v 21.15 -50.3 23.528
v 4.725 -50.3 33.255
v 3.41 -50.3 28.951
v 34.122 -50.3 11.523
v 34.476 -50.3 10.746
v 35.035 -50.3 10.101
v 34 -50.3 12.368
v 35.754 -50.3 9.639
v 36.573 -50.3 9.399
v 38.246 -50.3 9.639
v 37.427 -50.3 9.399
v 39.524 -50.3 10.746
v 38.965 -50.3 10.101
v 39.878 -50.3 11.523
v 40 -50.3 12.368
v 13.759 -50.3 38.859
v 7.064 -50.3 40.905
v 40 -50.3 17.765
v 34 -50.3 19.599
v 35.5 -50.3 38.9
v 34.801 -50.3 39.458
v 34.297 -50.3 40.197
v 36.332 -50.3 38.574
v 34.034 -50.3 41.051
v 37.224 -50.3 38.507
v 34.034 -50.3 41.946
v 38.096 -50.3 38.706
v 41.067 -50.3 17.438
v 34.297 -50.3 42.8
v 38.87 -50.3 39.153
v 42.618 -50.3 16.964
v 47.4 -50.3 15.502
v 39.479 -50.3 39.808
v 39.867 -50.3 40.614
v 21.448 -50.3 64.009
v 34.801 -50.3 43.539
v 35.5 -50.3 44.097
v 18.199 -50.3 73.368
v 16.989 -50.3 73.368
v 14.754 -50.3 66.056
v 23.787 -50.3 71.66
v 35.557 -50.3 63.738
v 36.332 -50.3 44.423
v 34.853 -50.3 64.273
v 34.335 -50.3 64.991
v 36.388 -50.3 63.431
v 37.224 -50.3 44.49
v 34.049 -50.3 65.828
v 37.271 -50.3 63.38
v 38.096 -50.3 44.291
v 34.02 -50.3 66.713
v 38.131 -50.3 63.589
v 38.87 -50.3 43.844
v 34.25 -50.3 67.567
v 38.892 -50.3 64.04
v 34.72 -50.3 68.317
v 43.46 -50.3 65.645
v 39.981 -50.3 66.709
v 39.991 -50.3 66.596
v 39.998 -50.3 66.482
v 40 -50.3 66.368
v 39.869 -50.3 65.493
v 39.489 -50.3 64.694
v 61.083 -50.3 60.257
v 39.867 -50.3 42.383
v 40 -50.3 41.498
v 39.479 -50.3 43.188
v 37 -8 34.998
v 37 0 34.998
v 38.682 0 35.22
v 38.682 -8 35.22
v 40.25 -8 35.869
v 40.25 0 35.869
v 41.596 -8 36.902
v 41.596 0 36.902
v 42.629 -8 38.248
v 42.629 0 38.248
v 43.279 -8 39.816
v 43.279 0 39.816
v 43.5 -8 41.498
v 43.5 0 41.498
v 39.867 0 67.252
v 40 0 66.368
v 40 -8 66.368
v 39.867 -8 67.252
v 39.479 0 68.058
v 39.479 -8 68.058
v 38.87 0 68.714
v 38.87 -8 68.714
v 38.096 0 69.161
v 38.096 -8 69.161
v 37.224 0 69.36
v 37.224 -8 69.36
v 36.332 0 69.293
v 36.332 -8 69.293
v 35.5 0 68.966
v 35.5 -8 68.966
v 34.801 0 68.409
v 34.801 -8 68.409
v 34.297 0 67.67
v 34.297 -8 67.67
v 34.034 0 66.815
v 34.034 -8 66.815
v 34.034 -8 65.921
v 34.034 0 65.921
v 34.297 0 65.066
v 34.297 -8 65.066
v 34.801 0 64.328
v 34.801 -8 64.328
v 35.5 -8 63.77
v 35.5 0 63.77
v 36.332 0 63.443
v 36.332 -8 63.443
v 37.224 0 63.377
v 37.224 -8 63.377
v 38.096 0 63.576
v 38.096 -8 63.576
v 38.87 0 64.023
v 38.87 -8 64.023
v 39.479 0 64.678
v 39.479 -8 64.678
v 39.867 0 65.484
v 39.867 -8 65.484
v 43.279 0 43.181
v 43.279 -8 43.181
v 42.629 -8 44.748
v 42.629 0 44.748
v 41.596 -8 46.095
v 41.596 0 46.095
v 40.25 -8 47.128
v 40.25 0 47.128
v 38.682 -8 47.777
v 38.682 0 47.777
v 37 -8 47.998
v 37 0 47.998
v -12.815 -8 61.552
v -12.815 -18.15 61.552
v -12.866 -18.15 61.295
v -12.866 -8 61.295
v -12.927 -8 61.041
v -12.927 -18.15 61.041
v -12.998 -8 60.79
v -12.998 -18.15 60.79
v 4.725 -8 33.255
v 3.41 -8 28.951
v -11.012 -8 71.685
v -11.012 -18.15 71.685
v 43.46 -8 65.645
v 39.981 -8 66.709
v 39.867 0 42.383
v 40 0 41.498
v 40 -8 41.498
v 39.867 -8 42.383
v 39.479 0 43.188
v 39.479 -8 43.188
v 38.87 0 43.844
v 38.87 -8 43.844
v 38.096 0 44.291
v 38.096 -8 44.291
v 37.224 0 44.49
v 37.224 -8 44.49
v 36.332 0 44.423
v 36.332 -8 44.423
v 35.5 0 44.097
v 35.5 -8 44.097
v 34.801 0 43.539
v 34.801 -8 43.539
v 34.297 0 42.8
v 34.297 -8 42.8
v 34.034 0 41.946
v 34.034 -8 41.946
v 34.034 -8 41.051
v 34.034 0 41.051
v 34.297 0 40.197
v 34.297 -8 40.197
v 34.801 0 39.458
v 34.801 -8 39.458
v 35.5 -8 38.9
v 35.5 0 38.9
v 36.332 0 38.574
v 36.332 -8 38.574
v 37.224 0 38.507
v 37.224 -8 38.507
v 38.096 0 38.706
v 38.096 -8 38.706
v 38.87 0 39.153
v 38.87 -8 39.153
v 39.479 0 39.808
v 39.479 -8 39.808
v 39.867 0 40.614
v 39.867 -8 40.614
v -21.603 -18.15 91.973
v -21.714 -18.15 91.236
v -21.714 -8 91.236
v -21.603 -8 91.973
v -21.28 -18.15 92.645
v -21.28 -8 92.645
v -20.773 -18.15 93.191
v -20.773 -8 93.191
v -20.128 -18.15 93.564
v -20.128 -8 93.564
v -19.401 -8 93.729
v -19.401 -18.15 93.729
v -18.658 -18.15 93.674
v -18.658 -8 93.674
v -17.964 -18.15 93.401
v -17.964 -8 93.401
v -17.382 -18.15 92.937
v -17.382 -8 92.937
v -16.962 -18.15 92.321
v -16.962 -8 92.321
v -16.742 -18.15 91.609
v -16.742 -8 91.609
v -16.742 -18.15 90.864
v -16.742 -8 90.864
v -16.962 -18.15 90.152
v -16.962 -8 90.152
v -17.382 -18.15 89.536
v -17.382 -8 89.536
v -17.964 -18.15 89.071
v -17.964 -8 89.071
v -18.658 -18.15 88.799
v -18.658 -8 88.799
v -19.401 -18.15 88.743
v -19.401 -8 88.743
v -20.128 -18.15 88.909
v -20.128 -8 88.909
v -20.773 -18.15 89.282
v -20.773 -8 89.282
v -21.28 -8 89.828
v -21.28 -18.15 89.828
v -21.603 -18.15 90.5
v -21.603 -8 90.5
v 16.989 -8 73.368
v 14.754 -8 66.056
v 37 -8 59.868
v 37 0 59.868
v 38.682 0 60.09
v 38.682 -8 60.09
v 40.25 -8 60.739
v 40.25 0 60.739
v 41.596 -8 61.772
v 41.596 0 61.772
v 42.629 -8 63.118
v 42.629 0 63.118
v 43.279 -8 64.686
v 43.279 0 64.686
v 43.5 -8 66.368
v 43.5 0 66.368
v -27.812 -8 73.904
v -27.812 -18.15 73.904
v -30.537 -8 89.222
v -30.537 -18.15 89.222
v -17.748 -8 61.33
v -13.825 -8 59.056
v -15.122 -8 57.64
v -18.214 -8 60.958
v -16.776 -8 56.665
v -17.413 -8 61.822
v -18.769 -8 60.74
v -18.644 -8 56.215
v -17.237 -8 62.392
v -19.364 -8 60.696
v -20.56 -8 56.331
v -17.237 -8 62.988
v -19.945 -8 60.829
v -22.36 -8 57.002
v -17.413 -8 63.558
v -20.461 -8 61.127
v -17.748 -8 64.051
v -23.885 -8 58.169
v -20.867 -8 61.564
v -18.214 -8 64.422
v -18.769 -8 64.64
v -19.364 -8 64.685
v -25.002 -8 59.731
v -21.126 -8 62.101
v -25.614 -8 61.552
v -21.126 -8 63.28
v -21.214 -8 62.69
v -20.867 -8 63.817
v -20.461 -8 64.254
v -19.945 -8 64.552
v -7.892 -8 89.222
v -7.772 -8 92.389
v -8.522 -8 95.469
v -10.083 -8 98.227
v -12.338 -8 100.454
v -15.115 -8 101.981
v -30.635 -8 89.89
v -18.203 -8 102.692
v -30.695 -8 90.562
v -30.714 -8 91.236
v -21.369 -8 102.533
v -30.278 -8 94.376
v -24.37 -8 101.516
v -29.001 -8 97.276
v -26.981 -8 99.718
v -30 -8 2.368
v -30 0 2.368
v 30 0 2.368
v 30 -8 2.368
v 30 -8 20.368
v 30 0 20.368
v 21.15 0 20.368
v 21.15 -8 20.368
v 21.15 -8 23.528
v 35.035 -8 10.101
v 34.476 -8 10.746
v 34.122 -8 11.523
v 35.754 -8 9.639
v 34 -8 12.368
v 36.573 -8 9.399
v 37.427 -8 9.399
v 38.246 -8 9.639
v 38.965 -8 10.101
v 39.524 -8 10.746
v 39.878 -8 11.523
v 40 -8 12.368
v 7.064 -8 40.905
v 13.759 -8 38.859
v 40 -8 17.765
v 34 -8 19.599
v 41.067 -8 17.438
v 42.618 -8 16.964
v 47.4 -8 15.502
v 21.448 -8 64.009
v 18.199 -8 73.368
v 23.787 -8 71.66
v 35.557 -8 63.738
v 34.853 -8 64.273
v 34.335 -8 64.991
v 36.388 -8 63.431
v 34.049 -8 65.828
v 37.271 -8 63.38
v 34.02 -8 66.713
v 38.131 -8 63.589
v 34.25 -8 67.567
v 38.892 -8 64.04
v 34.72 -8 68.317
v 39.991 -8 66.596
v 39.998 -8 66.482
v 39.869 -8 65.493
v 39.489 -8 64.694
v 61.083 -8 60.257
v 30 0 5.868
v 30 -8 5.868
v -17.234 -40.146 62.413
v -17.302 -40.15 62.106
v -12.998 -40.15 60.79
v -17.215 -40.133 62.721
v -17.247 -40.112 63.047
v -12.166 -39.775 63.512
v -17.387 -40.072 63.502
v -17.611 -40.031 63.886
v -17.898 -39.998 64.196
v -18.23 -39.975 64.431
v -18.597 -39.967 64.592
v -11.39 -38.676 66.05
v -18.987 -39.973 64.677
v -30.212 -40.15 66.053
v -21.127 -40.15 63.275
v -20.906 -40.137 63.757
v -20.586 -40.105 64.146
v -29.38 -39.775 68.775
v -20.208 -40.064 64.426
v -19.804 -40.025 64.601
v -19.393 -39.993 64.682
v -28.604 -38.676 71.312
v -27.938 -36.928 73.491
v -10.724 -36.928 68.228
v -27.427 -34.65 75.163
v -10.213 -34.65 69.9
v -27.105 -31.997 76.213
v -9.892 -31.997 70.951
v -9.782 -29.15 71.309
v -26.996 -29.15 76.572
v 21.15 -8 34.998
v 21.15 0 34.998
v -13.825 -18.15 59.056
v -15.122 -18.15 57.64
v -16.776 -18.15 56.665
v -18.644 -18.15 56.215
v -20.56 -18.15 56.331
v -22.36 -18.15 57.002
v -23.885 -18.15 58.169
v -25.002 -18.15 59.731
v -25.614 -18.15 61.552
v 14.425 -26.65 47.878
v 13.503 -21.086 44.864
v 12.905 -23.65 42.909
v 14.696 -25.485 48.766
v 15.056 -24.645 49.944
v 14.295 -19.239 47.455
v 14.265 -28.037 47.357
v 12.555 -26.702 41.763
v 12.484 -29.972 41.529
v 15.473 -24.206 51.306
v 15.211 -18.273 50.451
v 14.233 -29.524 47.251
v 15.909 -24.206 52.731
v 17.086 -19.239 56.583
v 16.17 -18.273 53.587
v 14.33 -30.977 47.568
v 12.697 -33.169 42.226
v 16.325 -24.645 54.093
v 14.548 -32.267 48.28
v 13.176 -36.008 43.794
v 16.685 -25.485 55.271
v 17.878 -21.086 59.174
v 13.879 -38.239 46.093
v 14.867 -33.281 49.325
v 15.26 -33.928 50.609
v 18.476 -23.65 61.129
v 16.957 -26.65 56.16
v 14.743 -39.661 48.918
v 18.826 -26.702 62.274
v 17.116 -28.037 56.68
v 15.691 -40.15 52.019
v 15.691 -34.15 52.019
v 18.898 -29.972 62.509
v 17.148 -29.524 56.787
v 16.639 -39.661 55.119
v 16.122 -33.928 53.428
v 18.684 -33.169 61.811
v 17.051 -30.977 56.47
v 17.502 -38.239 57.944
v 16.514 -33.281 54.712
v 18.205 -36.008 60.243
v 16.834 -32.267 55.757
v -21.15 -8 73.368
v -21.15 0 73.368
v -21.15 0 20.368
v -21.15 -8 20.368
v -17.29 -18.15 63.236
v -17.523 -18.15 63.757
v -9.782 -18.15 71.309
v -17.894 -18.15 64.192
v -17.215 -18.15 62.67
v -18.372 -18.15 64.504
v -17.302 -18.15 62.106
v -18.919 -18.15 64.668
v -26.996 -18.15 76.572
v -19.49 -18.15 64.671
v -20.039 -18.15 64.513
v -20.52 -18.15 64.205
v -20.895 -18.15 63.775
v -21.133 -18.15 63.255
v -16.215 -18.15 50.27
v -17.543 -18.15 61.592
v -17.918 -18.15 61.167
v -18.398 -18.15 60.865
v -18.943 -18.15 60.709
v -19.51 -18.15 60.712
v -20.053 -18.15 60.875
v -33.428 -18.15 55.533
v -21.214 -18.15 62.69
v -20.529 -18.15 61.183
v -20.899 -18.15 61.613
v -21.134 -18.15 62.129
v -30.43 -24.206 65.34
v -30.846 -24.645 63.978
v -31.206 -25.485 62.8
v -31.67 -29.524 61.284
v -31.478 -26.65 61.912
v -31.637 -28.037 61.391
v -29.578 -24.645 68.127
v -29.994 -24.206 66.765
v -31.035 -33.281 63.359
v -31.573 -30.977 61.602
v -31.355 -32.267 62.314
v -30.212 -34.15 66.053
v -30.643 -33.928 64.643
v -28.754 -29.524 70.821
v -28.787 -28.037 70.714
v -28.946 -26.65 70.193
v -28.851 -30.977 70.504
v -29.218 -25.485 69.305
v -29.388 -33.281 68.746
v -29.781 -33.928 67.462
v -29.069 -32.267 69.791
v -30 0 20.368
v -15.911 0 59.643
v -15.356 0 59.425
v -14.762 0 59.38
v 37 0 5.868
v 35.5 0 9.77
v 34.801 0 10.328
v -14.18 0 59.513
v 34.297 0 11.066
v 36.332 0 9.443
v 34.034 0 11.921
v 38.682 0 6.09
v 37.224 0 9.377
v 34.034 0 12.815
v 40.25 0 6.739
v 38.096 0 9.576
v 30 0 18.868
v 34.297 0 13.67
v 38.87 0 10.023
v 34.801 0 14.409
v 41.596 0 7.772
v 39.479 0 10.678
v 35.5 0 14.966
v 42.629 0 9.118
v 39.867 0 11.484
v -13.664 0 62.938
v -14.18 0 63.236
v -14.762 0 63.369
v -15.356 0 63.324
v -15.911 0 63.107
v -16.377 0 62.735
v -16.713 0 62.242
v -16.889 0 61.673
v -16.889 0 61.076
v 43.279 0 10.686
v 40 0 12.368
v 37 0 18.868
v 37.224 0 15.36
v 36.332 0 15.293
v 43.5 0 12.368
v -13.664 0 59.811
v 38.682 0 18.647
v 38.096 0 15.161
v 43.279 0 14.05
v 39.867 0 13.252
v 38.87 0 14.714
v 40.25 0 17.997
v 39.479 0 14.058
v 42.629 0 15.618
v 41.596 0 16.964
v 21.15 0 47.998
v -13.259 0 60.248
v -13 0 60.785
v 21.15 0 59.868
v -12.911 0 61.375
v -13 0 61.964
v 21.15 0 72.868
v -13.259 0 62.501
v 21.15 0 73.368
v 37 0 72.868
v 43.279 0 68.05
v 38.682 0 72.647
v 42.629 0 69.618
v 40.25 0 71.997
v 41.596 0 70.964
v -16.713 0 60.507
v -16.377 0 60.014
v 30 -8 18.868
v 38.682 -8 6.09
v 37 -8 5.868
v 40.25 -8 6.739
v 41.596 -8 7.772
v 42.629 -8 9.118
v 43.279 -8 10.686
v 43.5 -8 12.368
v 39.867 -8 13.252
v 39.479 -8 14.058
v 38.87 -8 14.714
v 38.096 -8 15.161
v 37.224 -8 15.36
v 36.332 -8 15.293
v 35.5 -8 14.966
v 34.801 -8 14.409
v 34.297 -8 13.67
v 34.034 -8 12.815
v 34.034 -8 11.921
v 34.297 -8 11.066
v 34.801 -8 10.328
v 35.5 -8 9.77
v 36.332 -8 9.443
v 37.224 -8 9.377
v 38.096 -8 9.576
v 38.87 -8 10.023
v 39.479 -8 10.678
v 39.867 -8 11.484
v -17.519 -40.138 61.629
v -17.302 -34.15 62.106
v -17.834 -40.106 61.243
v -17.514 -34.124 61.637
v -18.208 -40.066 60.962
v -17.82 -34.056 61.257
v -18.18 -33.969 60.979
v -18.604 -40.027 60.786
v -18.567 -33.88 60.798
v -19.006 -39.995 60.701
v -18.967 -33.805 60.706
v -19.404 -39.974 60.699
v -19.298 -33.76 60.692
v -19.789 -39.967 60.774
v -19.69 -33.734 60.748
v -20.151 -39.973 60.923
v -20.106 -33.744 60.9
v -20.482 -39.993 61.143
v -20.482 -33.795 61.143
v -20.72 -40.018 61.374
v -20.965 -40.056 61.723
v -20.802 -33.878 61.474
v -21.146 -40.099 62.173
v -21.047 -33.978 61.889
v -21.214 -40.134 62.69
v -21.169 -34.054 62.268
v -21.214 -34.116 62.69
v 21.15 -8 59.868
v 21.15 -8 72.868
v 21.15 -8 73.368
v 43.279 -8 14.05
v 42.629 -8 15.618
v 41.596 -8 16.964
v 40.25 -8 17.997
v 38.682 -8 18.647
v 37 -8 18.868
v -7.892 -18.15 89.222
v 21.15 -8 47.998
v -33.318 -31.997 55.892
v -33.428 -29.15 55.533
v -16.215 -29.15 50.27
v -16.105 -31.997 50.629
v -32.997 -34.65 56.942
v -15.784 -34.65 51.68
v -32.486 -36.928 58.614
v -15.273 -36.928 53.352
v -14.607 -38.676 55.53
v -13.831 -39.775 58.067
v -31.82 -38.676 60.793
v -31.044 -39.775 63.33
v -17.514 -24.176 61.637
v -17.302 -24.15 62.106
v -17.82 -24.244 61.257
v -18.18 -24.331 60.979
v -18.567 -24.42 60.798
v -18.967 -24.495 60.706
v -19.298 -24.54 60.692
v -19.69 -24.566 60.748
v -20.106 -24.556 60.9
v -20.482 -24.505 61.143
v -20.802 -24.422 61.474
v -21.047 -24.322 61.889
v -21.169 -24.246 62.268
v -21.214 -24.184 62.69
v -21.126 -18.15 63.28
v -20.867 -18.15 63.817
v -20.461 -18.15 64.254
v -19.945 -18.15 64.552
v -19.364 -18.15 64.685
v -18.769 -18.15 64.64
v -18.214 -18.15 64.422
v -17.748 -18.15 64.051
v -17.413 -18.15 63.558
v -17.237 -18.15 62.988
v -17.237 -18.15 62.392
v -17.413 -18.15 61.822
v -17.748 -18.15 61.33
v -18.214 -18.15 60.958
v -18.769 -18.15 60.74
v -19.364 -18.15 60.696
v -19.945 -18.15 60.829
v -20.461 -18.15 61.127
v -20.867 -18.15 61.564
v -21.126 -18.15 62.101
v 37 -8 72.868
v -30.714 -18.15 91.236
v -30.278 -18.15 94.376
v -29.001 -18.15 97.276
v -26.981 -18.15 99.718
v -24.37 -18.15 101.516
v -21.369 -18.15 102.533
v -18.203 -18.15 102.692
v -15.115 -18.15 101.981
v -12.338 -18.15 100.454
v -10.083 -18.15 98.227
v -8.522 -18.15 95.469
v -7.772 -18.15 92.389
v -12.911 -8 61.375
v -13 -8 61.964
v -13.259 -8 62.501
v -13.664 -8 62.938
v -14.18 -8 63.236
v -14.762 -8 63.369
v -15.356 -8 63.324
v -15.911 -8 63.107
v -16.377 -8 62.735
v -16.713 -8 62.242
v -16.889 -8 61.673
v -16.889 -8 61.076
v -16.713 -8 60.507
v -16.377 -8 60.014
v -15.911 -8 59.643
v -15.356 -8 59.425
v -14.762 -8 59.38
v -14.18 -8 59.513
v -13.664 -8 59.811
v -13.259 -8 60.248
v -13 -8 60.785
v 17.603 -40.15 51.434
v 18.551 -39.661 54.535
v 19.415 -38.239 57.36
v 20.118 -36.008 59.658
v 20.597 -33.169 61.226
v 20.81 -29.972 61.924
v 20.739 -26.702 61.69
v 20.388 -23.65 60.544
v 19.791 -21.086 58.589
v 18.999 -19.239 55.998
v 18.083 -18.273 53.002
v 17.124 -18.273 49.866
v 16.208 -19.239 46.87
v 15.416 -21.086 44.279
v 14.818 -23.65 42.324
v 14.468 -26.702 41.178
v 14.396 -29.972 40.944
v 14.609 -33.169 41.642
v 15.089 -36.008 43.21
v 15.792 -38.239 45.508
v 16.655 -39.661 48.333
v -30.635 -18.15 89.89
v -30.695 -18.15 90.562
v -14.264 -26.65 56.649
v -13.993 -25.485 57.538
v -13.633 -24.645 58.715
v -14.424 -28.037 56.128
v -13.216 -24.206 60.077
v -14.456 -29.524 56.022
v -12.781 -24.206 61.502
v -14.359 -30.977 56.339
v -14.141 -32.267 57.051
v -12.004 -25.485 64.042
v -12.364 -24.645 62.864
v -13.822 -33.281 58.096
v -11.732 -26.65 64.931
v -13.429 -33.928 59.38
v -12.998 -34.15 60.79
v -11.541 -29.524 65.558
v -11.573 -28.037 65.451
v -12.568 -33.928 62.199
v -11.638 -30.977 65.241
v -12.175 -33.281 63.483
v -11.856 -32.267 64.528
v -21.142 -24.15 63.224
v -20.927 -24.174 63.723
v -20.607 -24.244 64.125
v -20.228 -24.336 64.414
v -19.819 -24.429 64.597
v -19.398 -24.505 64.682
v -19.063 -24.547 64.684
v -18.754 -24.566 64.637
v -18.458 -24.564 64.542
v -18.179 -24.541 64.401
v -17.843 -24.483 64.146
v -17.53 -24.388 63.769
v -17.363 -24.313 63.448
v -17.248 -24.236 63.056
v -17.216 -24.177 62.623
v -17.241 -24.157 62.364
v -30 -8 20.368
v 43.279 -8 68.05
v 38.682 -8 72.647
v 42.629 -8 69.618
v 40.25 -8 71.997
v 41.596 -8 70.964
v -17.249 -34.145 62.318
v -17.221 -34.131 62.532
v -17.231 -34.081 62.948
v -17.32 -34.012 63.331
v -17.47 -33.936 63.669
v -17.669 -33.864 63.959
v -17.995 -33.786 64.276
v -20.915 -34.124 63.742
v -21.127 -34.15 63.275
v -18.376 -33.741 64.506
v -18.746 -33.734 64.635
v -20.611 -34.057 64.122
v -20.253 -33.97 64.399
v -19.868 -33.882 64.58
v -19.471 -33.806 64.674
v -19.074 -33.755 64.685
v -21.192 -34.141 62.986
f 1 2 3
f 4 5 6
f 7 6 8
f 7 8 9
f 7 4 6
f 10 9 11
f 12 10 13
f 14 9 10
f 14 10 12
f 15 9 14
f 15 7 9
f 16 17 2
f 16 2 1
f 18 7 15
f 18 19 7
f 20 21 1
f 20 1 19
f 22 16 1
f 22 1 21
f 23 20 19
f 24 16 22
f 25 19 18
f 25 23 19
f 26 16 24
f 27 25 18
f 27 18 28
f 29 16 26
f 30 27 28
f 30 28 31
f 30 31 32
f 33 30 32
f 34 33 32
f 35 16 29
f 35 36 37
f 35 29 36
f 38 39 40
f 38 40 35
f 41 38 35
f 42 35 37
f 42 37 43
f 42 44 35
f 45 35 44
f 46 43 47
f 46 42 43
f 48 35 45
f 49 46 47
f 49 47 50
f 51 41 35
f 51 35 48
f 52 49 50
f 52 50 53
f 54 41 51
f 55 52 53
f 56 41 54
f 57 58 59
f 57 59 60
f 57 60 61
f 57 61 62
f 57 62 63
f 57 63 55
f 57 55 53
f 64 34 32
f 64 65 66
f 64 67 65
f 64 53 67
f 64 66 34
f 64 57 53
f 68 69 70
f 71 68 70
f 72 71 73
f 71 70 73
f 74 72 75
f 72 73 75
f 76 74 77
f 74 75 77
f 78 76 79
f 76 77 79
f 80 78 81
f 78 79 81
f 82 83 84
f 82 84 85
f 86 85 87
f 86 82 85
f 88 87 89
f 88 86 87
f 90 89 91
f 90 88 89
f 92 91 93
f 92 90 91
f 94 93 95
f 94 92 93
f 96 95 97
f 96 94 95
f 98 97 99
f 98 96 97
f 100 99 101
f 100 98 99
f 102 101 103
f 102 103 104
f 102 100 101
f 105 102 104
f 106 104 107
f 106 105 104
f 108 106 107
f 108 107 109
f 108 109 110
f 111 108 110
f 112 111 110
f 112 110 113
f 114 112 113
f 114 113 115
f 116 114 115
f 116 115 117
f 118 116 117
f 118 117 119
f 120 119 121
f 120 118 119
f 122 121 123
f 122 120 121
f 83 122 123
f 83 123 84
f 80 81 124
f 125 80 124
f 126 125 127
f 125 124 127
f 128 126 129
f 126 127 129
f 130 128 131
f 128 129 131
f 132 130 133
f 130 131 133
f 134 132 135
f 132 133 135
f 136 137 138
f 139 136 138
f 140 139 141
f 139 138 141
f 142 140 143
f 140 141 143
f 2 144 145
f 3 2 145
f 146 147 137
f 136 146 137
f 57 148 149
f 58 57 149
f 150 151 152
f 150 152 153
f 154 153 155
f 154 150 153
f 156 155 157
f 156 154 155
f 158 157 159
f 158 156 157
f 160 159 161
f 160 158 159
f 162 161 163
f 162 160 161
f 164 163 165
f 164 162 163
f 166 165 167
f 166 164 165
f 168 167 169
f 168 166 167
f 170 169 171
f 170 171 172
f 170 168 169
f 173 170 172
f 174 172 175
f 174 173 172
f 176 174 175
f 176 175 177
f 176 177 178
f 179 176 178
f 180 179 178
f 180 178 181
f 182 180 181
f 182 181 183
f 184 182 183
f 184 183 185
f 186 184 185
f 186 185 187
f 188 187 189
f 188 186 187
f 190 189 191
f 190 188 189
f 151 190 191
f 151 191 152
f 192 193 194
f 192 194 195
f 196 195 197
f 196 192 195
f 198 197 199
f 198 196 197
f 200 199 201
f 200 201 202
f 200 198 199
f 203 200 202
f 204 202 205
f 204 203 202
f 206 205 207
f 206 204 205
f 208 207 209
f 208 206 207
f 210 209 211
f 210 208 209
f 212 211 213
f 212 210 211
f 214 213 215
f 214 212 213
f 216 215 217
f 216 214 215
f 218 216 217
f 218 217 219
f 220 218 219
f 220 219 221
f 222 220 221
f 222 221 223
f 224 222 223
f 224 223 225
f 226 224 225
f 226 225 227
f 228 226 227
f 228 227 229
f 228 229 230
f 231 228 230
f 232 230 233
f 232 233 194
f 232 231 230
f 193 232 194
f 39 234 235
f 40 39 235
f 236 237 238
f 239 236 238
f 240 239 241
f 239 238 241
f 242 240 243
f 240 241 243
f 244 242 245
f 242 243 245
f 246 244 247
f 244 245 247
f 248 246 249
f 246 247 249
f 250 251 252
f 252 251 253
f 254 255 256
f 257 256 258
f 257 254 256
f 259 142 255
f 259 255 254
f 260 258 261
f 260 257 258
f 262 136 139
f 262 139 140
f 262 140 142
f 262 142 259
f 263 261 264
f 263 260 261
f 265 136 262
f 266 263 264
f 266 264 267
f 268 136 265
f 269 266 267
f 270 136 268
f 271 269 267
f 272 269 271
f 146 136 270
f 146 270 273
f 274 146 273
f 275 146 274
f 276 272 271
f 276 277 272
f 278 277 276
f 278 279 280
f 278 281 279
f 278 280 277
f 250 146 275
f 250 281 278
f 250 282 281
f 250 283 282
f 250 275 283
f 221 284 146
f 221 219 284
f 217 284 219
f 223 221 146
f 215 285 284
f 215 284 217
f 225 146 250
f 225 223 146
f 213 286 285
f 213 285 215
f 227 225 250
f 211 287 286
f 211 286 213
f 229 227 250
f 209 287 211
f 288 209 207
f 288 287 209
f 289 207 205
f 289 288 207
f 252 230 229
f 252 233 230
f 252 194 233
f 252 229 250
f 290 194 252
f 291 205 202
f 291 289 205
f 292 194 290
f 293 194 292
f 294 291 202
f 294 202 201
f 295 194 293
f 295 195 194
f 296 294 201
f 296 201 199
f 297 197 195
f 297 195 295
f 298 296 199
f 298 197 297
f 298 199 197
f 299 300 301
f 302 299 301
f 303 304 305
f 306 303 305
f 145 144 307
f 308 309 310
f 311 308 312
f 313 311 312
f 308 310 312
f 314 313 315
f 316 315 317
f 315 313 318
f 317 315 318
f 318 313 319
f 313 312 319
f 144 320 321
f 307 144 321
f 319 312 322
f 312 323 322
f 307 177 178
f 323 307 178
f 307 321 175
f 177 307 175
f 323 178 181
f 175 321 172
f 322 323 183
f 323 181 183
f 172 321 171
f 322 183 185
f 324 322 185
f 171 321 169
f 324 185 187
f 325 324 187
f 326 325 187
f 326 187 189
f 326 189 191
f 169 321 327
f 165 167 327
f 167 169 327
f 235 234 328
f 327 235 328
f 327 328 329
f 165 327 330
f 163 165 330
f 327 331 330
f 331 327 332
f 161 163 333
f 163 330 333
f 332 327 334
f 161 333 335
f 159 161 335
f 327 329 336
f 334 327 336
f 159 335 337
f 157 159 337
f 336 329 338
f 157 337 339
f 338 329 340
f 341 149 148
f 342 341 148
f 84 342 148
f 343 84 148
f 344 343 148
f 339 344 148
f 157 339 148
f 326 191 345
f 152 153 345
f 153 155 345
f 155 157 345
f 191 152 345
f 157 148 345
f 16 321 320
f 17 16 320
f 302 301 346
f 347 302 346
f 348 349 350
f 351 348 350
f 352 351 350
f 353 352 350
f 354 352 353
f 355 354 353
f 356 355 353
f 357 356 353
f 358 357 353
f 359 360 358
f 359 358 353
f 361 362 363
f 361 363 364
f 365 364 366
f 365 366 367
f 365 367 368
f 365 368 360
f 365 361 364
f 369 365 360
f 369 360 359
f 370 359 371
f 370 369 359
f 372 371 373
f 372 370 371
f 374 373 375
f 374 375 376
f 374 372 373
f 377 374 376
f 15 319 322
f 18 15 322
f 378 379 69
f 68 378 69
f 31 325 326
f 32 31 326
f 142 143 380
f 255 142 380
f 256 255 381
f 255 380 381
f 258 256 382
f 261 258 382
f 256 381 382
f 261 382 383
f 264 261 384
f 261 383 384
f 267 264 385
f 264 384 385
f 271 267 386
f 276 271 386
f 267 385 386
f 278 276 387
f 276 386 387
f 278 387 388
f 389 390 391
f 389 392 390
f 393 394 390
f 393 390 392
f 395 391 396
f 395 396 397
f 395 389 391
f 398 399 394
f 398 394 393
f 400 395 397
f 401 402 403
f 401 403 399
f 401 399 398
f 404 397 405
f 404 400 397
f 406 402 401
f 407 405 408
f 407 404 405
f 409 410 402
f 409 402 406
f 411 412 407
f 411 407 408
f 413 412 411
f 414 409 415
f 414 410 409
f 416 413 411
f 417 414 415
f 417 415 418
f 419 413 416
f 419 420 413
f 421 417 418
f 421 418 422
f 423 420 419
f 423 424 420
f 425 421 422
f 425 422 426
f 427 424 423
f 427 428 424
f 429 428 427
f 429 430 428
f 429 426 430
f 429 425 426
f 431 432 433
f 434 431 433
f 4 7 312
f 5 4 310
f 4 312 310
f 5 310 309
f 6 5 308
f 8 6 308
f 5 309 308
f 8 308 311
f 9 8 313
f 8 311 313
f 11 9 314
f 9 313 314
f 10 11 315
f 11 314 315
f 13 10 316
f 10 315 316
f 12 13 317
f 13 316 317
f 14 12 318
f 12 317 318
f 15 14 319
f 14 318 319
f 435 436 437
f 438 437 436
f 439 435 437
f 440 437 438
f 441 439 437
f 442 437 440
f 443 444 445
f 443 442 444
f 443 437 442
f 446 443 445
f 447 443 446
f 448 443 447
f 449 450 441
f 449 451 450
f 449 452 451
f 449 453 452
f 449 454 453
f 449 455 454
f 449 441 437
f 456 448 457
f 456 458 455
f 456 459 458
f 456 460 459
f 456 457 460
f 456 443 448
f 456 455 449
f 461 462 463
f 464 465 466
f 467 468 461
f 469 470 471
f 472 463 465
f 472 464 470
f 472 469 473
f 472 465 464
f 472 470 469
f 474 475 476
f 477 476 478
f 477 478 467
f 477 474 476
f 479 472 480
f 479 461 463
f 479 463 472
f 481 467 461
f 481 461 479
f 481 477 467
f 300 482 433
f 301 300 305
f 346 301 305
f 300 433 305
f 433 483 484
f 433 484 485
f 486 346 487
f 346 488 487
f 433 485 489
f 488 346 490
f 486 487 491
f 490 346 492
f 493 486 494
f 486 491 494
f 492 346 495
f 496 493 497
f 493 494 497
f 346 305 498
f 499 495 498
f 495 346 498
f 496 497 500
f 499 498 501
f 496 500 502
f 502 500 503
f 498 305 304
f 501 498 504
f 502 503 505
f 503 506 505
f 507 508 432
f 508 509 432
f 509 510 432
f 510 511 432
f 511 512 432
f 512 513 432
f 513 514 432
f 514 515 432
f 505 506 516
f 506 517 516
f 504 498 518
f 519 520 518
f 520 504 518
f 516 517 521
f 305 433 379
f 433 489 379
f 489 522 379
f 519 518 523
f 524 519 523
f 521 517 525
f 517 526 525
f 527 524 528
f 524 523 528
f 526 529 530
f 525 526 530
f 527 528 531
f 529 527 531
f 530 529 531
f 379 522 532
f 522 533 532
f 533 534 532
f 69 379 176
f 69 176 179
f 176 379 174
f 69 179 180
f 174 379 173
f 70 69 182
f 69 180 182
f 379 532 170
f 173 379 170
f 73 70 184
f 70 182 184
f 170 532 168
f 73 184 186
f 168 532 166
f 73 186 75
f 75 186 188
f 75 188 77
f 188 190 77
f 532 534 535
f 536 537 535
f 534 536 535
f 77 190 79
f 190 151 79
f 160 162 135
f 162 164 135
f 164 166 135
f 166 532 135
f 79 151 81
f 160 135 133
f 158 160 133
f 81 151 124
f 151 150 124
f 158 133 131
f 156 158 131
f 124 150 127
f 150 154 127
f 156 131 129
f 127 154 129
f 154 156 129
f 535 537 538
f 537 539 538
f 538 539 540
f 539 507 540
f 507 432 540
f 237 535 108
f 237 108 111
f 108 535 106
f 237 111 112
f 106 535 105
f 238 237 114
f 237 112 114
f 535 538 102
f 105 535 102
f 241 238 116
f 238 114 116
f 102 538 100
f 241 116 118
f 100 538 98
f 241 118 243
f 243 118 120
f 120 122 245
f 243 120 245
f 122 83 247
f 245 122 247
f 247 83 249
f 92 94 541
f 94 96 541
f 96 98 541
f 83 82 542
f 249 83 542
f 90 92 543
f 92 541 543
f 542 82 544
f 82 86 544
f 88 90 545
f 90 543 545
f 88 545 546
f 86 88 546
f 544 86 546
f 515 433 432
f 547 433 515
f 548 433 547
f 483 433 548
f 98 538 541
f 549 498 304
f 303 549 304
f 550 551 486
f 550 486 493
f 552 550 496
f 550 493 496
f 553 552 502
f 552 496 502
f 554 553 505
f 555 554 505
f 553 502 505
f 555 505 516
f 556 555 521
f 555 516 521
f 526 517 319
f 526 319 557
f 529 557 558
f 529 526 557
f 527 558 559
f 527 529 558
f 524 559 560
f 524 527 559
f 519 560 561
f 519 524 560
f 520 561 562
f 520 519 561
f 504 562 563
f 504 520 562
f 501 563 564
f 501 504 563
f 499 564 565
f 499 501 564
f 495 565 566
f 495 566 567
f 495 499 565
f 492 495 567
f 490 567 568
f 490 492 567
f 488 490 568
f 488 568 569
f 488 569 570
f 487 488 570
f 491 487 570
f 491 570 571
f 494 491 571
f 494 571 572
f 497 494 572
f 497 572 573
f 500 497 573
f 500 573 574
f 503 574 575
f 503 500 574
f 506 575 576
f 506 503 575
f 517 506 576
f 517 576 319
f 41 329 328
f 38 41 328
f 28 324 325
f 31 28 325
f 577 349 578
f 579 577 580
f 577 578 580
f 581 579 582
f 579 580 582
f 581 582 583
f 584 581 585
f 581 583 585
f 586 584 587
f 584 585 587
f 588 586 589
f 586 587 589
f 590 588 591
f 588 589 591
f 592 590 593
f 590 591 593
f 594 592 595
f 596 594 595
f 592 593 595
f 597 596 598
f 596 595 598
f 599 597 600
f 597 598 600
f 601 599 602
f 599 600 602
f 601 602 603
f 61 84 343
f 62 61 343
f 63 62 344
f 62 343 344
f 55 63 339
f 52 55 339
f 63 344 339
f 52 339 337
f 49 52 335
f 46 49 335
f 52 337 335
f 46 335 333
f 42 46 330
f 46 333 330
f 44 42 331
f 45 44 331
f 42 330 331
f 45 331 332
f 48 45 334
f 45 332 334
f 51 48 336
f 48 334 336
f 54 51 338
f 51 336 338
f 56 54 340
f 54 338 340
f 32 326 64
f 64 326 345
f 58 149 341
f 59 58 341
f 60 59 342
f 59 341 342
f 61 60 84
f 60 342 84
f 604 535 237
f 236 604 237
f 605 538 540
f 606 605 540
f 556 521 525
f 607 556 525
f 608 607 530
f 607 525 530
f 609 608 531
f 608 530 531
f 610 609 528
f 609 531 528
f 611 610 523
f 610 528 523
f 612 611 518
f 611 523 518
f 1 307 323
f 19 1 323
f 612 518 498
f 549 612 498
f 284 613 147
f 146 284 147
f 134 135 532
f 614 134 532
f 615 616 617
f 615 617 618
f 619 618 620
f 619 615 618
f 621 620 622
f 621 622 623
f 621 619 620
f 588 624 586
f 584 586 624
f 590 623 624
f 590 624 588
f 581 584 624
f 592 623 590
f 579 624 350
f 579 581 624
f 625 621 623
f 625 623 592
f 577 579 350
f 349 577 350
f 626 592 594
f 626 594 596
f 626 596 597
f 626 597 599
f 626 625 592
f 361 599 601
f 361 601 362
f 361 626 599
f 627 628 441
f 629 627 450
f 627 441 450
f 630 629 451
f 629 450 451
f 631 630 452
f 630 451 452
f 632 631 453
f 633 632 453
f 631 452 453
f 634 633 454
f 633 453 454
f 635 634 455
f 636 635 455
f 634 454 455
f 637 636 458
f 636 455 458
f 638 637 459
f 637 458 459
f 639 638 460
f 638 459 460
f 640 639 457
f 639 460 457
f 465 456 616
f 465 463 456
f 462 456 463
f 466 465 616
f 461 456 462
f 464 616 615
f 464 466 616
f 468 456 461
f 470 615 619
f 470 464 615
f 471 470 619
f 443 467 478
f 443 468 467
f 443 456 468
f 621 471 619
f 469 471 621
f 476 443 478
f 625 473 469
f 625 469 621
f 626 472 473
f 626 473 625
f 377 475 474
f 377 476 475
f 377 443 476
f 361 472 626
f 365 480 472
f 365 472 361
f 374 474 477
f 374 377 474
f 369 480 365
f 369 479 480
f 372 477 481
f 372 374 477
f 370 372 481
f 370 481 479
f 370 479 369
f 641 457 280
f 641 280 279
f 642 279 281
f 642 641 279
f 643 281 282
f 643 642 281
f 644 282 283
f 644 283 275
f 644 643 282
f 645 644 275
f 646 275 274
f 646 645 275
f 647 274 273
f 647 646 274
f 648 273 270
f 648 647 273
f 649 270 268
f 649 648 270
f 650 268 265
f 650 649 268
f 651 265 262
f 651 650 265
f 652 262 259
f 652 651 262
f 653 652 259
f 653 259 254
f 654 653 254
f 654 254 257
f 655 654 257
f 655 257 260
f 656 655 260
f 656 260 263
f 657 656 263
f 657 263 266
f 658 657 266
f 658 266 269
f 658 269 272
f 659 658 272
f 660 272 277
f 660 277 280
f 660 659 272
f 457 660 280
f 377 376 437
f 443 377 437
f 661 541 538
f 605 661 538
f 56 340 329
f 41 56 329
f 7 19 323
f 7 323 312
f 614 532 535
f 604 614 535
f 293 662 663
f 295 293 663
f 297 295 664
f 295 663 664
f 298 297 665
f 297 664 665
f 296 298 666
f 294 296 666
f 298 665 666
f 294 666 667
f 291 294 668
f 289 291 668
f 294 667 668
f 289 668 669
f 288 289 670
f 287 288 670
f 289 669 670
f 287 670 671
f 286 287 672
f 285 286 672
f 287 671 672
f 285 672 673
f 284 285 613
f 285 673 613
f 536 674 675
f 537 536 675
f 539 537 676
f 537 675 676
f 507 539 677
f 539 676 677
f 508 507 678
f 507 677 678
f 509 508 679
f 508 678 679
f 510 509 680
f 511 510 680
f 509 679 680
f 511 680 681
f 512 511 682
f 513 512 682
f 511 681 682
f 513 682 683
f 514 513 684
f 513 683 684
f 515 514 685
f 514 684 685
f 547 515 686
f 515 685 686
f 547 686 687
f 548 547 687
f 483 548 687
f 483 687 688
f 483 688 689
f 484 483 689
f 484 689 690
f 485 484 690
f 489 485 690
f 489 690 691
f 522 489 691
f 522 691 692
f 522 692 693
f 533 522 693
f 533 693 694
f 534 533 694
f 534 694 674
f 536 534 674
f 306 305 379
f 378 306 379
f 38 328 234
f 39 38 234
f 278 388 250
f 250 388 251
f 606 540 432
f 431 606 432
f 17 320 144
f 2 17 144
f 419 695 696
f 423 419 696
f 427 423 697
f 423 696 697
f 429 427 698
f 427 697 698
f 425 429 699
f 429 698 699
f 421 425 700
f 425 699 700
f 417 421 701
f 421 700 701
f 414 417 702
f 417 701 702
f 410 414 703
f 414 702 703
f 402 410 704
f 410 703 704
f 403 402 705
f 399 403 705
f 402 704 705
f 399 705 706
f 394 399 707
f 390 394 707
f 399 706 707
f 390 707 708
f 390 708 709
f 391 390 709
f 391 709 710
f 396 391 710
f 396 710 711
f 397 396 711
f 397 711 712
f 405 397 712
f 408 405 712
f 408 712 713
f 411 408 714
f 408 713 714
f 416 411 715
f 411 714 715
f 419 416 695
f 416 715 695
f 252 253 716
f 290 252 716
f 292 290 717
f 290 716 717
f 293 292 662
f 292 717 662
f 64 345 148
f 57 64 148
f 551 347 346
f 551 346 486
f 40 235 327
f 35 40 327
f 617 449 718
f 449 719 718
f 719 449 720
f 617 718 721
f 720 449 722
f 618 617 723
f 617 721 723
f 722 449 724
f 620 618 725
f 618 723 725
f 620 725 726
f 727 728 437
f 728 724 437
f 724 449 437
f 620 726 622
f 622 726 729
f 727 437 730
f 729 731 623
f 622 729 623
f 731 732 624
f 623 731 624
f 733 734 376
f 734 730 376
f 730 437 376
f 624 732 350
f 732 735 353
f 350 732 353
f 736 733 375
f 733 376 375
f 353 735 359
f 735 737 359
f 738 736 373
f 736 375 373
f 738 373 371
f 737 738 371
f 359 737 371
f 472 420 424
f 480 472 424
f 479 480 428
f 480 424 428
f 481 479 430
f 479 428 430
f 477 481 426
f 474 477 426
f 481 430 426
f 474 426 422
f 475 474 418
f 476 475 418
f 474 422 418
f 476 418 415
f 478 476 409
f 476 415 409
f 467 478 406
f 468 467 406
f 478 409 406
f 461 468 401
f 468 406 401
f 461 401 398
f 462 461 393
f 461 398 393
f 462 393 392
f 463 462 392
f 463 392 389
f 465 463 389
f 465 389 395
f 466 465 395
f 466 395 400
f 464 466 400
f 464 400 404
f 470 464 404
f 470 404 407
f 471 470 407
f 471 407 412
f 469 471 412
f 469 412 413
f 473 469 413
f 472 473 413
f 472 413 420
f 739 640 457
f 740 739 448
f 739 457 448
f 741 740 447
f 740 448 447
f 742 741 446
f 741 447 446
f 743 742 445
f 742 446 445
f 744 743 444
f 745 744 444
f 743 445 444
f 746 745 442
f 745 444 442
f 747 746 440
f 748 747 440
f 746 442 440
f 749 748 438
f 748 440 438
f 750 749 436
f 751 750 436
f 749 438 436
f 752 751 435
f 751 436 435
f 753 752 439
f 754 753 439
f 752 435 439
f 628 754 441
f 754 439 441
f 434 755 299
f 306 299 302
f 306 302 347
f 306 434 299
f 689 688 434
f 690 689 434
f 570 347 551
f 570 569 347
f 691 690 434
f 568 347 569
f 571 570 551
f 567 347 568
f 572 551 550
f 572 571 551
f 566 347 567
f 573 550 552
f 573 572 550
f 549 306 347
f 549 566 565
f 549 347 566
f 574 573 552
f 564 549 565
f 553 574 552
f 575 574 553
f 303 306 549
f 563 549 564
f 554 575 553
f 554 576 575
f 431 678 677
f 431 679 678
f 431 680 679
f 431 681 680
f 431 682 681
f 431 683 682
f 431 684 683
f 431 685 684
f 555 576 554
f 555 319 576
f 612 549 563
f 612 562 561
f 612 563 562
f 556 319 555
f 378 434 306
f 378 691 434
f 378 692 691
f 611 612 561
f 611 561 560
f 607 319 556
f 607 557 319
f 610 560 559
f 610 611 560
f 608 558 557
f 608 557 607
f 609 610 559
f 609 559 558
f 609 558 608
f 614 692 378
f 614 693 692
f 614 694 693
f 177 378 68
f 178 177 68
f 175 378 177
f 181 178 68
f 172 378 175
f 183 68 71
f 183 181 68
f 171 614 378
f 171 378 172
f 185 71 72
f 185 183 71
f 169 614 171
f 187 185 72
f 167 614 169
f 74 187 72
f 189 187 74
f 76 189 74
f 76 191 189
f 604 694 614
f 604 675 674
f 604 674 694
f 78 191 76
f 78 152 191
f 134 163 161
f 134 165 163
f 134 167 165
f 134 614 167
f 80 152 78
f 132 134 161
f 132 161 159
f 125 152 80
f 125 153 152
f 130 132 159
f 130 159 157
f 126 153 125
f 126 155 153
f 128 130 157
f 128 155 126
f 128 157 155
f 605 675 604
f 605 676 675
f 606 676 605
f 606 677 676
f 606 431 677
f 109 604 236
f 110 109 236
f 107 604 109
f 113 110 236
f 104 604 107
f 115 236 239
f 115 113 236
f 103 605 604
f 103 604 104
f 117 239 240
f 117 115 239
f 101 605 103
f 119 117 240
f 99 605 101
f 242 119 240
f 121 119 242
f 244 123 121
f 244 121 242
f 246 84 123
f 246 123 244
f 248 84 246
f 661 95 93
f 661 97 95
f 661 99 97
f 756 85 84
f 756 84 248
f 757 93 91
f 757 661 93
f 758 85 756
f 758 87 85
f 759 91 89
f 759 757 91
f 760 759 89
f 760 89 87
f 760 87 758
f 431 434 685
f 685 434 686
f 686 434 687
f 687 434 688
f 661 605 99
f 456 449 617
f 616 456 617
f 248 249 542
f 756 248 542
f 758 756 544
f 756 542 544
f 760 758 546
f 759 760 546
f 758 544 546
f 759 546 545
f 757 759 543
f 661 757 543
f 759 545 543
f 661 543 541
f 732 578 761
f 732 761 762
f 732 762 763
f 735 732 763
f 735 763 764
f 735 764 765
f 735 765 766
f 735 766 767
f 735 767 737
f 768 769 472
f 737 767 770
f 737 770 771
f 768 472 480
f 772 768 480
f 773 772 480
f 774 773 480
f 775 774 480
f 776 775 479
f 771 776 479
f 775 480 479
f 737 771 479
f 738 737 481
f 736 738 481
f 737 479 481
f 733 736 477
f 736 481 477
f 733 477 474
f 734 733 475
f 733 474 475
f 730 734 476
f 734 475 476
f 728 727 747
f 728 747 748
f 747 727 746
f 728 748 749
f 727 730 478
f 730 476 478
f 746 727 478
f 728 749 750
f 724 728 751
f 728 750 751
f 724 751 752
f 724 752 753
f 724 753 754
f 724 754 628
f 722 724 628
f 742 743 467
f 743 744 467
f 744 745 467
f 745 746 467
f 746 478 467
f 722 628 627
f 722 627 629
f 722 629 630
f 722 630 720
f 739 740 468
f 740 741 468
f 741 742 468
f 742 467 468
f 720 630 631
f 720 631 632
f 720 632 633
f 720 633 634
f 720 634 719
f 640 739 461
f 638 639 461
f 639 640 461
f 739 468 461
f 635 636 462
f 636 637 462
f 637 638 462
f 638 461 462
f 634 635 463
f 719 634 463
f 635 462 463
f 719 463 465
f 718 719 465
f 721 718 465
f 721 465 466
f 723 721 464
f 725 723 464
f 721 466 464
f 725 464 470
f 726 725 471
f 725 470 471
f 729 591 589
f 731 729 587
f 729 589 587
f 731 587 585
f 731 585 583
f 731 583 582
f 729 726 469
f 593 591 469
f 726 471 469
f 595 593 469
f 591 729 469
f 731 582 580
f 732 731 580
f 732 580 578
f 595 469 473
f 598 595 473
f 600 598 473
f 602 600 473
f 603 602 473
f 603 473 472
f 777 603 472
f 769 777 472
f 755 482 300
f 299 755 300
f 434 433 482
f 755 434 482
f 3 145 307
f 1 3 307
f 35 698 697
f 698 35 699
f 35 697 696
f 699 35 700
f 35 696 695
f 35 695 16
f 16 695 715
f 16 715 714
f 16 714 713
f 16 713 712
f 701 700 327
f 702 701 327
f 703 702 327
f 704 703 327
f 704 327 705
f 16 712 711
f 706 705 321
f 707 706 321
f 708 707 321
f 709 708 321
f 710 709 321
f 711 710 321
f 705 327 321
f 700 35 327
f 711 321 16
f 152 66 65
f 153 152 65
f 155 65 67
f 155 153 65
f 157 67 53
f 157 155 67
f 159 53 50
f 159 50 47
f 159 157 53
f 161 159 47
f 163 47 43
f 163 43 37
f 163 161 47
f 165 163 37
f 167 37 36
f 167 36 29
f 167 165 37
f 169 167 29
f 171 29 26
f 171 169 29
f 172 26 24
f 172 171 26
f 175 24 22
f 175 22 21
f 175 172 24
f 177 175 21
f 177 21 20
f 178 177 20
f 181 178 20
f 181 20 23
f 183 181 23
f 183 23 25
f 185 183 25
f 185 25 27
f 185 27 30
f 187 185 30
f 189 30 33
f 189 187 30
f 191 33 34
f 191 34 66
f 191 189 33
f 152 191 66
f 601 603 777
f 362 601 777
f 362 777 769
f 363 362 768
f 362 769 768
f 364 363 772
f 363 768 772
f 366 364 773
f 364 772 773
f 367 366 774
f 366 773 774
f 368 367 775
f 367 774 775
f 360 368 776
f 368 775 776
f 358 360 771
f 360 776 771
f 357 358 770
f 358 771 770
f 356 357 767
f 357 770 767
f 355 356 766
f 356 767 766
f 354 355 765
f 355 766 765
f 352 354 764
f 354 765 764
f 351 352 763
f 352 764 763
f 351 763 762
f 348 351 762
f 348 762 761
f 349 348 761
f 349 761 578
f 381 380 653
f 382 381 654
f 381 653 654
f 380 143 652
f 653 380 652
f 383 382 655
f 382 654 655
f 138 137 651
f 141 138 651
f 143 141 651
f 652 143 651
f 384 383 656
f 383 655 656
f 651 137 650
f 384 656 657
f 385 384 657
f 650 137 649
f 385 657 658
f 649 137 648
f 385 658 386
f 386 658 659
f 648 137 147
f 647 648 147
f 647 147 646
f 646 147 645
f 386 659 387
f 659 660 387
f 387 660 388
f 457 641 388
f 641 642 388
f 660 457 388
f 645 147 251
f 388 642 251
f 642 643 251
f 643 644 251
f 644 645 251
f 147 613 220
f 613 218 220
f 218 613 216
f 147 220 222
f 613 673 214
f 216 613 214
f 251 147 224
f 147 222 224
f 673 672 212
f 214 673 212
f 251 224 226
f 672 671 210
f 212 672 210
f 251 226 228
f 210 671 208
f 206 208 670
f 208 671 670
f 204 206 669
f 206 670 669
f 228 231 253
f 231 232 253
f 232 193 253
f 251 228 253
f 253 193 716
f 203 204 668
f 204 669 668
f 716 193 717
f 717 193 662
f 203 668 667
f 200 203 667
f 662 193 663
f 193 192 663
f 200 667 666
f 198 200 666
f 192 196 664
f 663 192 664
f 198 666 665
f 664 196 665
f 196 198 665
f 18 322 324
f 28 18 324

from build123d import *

# Parameters (mm, degrees)
F0_R      = 3
F1_DEPTH  = 8
F2_R      = 3
F3_DEPTH  = 42.3
F4_R      = 5
F5_DEPTH  = 50
F6_R      = 5
F7_DEPTH  = 18
F8_R      = 11
F8_R_2    = 5
F9_DEPTH  = 2
F11_DEPTH = 25
F12_R     = 2.5
F12_R_2   = 2
F13_DEPTH = 10.15
F14_R     = 2
F15_DEPTH = 25


with BuildPart() as f1:
    # F0 (on Front) → F1 (new body)
    with BuildSketch(Plane.XZ):
        Polygon((-21.15, 73.3681349903), (-21.15, 68.3681349903), (21.15, 68.3681349903), (21.15, 72.8681349903), (21.15, 73.3681349903), align=None)
        Polygon((-21.15, 20.3681349903), (21.15, 20.3681349903), (21.15, 34.9984337986), (21.15, 47.9984337986), (21.15, 59.8681349903), (21.15, 68.3681349903), (-21.15, 68.3681349903), align=None)
        Polygon((30, 20.3681349903), (21.15, 20.3681349903), (-21.15, 20.3681349903), (-30, 20.3681349903), (-30, 2.3681349903), (30, 2.3681349903), (30, 5.8681349903), (30, 18.8681349903), align=None)
        with BuildLine():
            Line((37, 18.8681349903), (30, 18.8681349903))
            Line((30, 18.8681349903), (30, 5.8681349903))
            Line((30, 5.8681349903), (37, 5.8681349903))
            ThreePointArc((37, 5.8681349903), (30.5, 12.3681349903), (37, 18.8681349903))
        make_face()
        with BuildLine():
            ThreePointArc((43.5, 12.3681349903), (41.5961940777, 16.964329068), (37, 18.8681349903))
            ThreePointArc((37, 18.8681349903), (30.5, 12.3681349903), (37, 5.8681349903))
            ThreePointArc((37, 5.8681349903), (41.5961940777, 7.7719409126), (43.5, 12.3681349903))
        make_face()
        with Locations((37, 12.3681349903)):
            Circle(F0_R, mode=Mode.SUBTRACT)
        with BuildLine():
            Line((21.15, 72.8681349903), (21.15, 68.3681349903))
            Line((21.15, 68.3681349903), (21.15, 59.8681349903))
            Line((21.15, 59.8681349903), (37, 59.8681349903))
            ThreePointArc((37, 59.8681349903), (30.5, 66.3681349903), (37, 72.8681349903))
            Line((37, 72.8681349903), (21.15, 72.8681349903))
        make_face()
        with BuildLine():
            ThreePointArc((37, 72.8681349903), (30.5, 66.3681349903), (37, 59.8681349903))
            ThreePointArc((37, 59.8681349903), (41.5961940777, 61.7719409126), (43.5, 66.3681349903))
            ThreePointArc((43.5, 66.3681349903), (41.5961940777, 70.964329068), (37, 72.8681349903))
        make_face()
        with Locations((37, 66.3681349903)):
            Circle(F0_R, mode=Mode.SUBTRACT)
        with BuildLine():
            ThreePointArc((37, 47.9984337986), (30.5, 41.4984337986), (37, 34.9984337986))
            ThreePointArc((37, 34.9984337986), (41.5961940777, 36.9022397208), (43.5, 41.4984337986))
            ThreePointArc((43.5, 41.4984337986), (41.5961940777, 46.0946278763), (37, 47.9984337986))
        make_face()
        with Locations((37, 41.4984337986)):
            Circle(F0_R, mode=Mode.SUBTRACT)
        with BuildLine():
            Line((21.15, 47.9984337986), (21.15, 34.9984337986))
            Line((21.15, 34.9984337986), (37, 34.9984337986))
            ThreePointArc((37, 34.9984337986), (30.5, 41.4984337986), (37, 47.9984337986))
            Line((37, 47.9984337986), (21.15, 47.9984337986))
        make_face()
    extrude(amount=F1_DEPTH)

    # F14 (on face) → F15 (cut)
    with BuildSketch(Plane.XZ.offset(8)):
        with Locations((-14.9110994137, 61.3745759752)):
            Circle(F14_R)
    extrude(amount=-F15_DEPTH, mode=Mode.SUBTRACT)


with BuildPart() as f3:
    # F2 (on face) → F3 (new body)
    with BuildSketch(Plane.XZ.offset(8)):
        with BuildLine():
            Line((21.15, 28.2332108276), (43.9339624369, 21.2674544655))
            Line((43.9339624369, 21.2674544655), (56.3012855467, 61.7191456427))
            Line((56.3012855467, 61.7191456427), (43.4596744605, 65.6452201511))
            ThreePointArc((43.4596744605, 65.6452201511), (41.3330735942, 61.5230887339), (37, 59.8681349903))
            Line((37, 59.8681349903), (21.15, 59.8681349903))
            Line((21.15, 59.8681349903), (21.15, 47.9984337986))
            Line((21.15, 47.9984337986), (37, 47.9984337986))
            ThreePointArc((37, 47.9984337986), (43.5, 41.4984337986), (37, 34.9984337986))
            Line((37, 34.9984337986), (21.15, 34.9984337986))
            Line((21.15, 34.9984337986), (21.15, 28.2332108276))
        make_face()
        with BuildLine():
            Line((11.4196007342, 31.2080924261), (21.15, 28.2332108276))
            Line((21.15, 28.2332108276), (21.15, 34.9984337986))
            Line((21.15, 34.9984337986), (37, 34.9984337986))
            ThreePointArc((37, 34.9984337986), (43.5, 41.4984337986), (37, 47.9984337986))
            Line((37, 47.9984337986), (21.15, 47.9984337986))
            Line((21.15, 47.9984337986), (21.15, 59.8681349903))
            Line((21.15, 59.8681349903), (37, 59.8681349903))
            ThreePointArc((37, 59.8681349903), (41.3330735942, 61.5230887339), (43.4596744605, 65.6452201511))
            Line((43.4596744605, 65.6452201511), (39.9805854868, 66.7088843939))
            ThreePointArc((39.9805854868, 66.7088843939), (39.995142439, 66.538786008), (40, 66.3681349903))
            ThreePointArc((40, 66.3681349903), (35.9611107194, 63.55375956), (34.7195272916, 68.3173513011))
            Line((34.7195272916, 68.3173513011), (23.786923844, 71.6597836033))
            Line((23.786923844, 71.6597836033), (21.4479502062, 64.0093455556))
            Line((21.4479502062, 64.0093455556), (13.758574372, 38.8585304738))
            Line((13.758574372, 38.8585304738), (11.4196007342, 31.2080924261))
        make_face()
        with Locations((37, 41.4984337986)):
            Circle(F2_R, mode=Mode.SUBTRACT)
        Polygon((14.7538169144, 66.0559474886), (21.4479502062, 64.0093455556), (23.786923844, 71.6597836033), (18.1991582363, 73.3681349903), (16.9893769823, 73.3681349903), align=None)
        Polygon((7.0644410802, 40.9051324068), (4.7254674424, 33.2546943591), (11.4196007342, 31.2080924261), (13.758574372, 38.8585304738), align=None)
        Polygon((3.4097947712, 28.9513229573), (21.15, 23.5275979235), (21.15, 28.2332108276), (11.4196007342, 31.2080924261), (4.7254674424, 33.2546943591), align=None)
        with BuildLine():
            Line((34, 19.5989586667), (36.3904165355, 18.8681349903))
            Line((36.3904165355, 18.8681349903), (37, 18.8681349903))
            ThreePointArc((37, 18.8681349903), (39.1557432081, 18.500244841), (41.0674628191, 17.4382184429))
            Line((41.0674628191, 17.4382184429), (42.6182897657, 16.9640830636))
            Line((42.6182897657, 16.9640830636), (43.9339624369, 21.2674544655))
            Line((43.9339624369, 21.2674544655), (21.15, 28.2332108276))
            Line((21.15, 28.2332108276), (21.15, 23.5275979235))
            Line((21.15, 23.5275979235), (34, 19.5989586667))
        make_face()
        with BuildLine():
            ThreePointArc((34, 12.3681349903), (37, 9.3681349903), (40, 12.3681349903))
            ThreePointArc((40, 12.3681349903), (37, 15.3681349903), (34, 12.3681349903))
        make_face()
        with BuildLine():
            ThreePointArc((34, 12.3681349903), (37, 15.3681349903), (40, 12.3681349903))
            Line((40, 12.3681349903), (40, 17.764574578))
            Line((40, 17.764574578), (36.3904165355, 18.8681349903))
            Line((36.3904165355, 18.8681349903), (34, 18.8681349903))
            Line((34, 18.8681349903), (34, 12.3681349903))
        make_face()
        with BuildLine():
            Line((36.3904165355, 18.8681349903), (40, 17.764574578))
            Line((40, 17.764574578), (41.0674628191, 17.4382184429))
            ThreePointArc((41.0674628191, 17.4382184429), (39.1557432081, 18.500244841), (37, 18.8681349903))
            Line((37, 18.8681349903), (36.3904165355, 18.8681349903))
        make_face()
        Polygon((34, 19.5989586667), (34, 18.8681349903), (36.3904165355, 18.8681349903), align=None)
        Polygon((43.9339624369, 21.2674544655), (42.6182897657, 16.9640830636), (47.3998135455, 15.50222454), (61.0828093265, 60.2572871191), (56.3012855467, 61.7191456427), align=None)
    extrude(amount=F3_DEPTH)

    # F4 (on face) → F5 (join)
    with BuildSketch(Plane(origin=(1.7177674954, 0, -0.525174227), x_dir=(0, -1, 0), z_dir=(-0.956304756, 0, 0.2923717047))):
        with Locations((29.15, 54.3332153455)):
            Circle(F4_R)
    extrude(amount=F5_DEPTH)

    # F8 (on face) → F9 (join)
    with BuildSketch(Plane(origin=(1.7177674954, 0, -0.525174227), x_dir=(0, -1, 0), z_dir=(-0.956304756, 0, 0.2923717047))):
        with Locations((29.15, 54.3332153455)):
            Circle(F8_R)
        with Locations((29.15, 54.3332153455)):
            Circle(F8_R_2, mode=Mode.SUBTRACT)
    extrude(amount=F9_DEPTH)


with BuildPart() as f7:
    # F6 (on face) → F7 (new body)
    with BuildSketch(Plane(origin=(-46.0974703027, 0, 14.0934110092), x_dir=(0, -1, 0), z_dir=(-0.956304756, 0, 0.2923717047))):
        with BuildLine():
            ThreePointArc((29.15, 43.3332153455), (36.9281745931, 46.5550407524), (40.15, 54.3332153455))
            ThreePointArc((40.15, 54.3332153455), (36.9281745931, 62.1113899385), (29.15, 65.3332153455))
            ThreePointArc((29.15, 65.3332153455), (21.3718254069, 62.1113899385), (18.15, 54.3332153455))
            ThreePointArc((18.15, 54.3332153455), (21.3718254069, 46.5550407524), (29.15, 43.3332153455))
        make_face()
        with Locations((29.15, 54.3332153455)):
            Circle(F6_R, mode=Mode.SUBTRACT)
        with BuildLine():
            ThreePointArc((18.15, 54.3332153455), (21.3718254069, 62.1113899385), (29.15, 65.3332153455))
            Line((29.15, 65.3332153455), (18.15, 65.3332153455))
            Line((18.15, 65.3332153455), (18.15, 54.3332153455))
        make_face()
        with BuildLine():
            Line((18.15, 43.3332153455), (29.15, 43.3332153455))
            ThreePointArc((29.15, 43.3332153455), (21.3718254069, 46.5550407524), (18.15, 54.3332153455))
            Line((18.15, 54.3332153455), (18.15, 43.3332153455))
        make_face()
    extrude(amount=-F7_DEPTH)

    # F10 (on face) → F11 (cut)
    with BuildSketch(Plane(origin=(0, -18.15, 0), x_dir=(-1, 0, 0), z_dir=(0, 1, 0))):
        with BuildLine():
            ThreePointArc((21.2144708155, 62.6902486465), (18.9188519932, 64.6682803732), (17.3018613036, 62.105505237))
            ThreePointArc((17.3018613036, 62.105505237), (19.5100896378, 60.7122169198), (21.2144708155, 62.6902486465))
        make_face()
    extrude(amount=-F11_DEPTH, mode=Mode.SUBTRACT)


with BuildPart() as f13:
    # F12 (on face) → F13 (new body, through all)
    with BuildSketch(Plane(origin=(0, -18.15, 0), x_dir=(-1, 0, 0), z_dir=(0, 1, 0))):
        with BuildLine():
            ThreePointArc((30.7144708155, 91.2364348769), (18.2034159592, 102.6919037926), (7.8922502803, 89.2221553154))
            ThreePointArc((7.8922502803, 89.2221553154), (19.2144707625, 79.7364348769), (30.5366913321, 89.2221552109))
            ThreePointArc((30.5366913321, 89.2221552109), (30.6699397265, 90.2253799677), (30.7144708155, 91.2364348769))
        make_face()
        with Locations((19.2144708155, 91.2364348769)):
            Circle(F12_R, mode=Mode.SUBTRACT)
        with BuildLine():
            Line((7.8922502803, 89.2221553154), (11.0121688692, 71.6851626043))
            Line((11.0121688692, 71.6851626043), (26.9958867571, 76.5718755664))
            Line((26.9958867571, 76.5718755664), (27.811523534, 73.904047879))
            Line((27.811523534, 73.904047879), (30.5366913321, 89.2221552109))
            ThreePointArc((30.5366913321, 89.2221552109), (19.2144707625, 79.7364348769), (7.8922502803, 89.2221553154))
        make_face()
        with BuildLine():
            ThreePointArc((25.6139867517, 61.5517427032), (25.6893010675, 62.1187828055), (25.7144708155, 62.6902486465))
            ThreePointArc((25.7144708155, 62.6902486465), (18.6430050699, 69.1650789069), (12.8149548458, 61.5517428919))
            ThreePointArc((12.8149548458, 61.5517428919), (12.8952289767, 61.1680191688), (12.9984898668, 60.7898326801))
            ThreePointArc((12.9984898668, 60.7898326801), (19.6063228204, 56.2020707816), (25.6139867517, 61.5517427032))
        make_face()
        with Locations((19.2144708155, 62.6902486465)):
            Circle(F12_R_2, mode=Mode.SUBTRACT)
        with BuildLine():
            ThreePointArc((12.8149548458, 61.5517428919), (18.6430050699, 69.1650789069), (25.7144708155, 62.6902486465))
            ThreePointArc((25.7144708155, 62.6902486465), (25.6893010675, 62.1187828055), (25.6139867517, 61.5517427032))
            Line((25.6139867517, 61.5517427032), (27.811523534, 73.904047879))
            Line((27.811523534, 73.904047879), (26.9958867571, 76.5718755664))
            Line((26.9958867571, 76.5718755664), (11.0121688692, 71.6851626043))
            Line((11.0121688692, 71.6851626043), (12.8149548458, 61.5517428919))
        make_face()
    extrude(amount=F13_DEPTH)


solid = Compound([f1.part, f3.part, f7.part, f13.part])
